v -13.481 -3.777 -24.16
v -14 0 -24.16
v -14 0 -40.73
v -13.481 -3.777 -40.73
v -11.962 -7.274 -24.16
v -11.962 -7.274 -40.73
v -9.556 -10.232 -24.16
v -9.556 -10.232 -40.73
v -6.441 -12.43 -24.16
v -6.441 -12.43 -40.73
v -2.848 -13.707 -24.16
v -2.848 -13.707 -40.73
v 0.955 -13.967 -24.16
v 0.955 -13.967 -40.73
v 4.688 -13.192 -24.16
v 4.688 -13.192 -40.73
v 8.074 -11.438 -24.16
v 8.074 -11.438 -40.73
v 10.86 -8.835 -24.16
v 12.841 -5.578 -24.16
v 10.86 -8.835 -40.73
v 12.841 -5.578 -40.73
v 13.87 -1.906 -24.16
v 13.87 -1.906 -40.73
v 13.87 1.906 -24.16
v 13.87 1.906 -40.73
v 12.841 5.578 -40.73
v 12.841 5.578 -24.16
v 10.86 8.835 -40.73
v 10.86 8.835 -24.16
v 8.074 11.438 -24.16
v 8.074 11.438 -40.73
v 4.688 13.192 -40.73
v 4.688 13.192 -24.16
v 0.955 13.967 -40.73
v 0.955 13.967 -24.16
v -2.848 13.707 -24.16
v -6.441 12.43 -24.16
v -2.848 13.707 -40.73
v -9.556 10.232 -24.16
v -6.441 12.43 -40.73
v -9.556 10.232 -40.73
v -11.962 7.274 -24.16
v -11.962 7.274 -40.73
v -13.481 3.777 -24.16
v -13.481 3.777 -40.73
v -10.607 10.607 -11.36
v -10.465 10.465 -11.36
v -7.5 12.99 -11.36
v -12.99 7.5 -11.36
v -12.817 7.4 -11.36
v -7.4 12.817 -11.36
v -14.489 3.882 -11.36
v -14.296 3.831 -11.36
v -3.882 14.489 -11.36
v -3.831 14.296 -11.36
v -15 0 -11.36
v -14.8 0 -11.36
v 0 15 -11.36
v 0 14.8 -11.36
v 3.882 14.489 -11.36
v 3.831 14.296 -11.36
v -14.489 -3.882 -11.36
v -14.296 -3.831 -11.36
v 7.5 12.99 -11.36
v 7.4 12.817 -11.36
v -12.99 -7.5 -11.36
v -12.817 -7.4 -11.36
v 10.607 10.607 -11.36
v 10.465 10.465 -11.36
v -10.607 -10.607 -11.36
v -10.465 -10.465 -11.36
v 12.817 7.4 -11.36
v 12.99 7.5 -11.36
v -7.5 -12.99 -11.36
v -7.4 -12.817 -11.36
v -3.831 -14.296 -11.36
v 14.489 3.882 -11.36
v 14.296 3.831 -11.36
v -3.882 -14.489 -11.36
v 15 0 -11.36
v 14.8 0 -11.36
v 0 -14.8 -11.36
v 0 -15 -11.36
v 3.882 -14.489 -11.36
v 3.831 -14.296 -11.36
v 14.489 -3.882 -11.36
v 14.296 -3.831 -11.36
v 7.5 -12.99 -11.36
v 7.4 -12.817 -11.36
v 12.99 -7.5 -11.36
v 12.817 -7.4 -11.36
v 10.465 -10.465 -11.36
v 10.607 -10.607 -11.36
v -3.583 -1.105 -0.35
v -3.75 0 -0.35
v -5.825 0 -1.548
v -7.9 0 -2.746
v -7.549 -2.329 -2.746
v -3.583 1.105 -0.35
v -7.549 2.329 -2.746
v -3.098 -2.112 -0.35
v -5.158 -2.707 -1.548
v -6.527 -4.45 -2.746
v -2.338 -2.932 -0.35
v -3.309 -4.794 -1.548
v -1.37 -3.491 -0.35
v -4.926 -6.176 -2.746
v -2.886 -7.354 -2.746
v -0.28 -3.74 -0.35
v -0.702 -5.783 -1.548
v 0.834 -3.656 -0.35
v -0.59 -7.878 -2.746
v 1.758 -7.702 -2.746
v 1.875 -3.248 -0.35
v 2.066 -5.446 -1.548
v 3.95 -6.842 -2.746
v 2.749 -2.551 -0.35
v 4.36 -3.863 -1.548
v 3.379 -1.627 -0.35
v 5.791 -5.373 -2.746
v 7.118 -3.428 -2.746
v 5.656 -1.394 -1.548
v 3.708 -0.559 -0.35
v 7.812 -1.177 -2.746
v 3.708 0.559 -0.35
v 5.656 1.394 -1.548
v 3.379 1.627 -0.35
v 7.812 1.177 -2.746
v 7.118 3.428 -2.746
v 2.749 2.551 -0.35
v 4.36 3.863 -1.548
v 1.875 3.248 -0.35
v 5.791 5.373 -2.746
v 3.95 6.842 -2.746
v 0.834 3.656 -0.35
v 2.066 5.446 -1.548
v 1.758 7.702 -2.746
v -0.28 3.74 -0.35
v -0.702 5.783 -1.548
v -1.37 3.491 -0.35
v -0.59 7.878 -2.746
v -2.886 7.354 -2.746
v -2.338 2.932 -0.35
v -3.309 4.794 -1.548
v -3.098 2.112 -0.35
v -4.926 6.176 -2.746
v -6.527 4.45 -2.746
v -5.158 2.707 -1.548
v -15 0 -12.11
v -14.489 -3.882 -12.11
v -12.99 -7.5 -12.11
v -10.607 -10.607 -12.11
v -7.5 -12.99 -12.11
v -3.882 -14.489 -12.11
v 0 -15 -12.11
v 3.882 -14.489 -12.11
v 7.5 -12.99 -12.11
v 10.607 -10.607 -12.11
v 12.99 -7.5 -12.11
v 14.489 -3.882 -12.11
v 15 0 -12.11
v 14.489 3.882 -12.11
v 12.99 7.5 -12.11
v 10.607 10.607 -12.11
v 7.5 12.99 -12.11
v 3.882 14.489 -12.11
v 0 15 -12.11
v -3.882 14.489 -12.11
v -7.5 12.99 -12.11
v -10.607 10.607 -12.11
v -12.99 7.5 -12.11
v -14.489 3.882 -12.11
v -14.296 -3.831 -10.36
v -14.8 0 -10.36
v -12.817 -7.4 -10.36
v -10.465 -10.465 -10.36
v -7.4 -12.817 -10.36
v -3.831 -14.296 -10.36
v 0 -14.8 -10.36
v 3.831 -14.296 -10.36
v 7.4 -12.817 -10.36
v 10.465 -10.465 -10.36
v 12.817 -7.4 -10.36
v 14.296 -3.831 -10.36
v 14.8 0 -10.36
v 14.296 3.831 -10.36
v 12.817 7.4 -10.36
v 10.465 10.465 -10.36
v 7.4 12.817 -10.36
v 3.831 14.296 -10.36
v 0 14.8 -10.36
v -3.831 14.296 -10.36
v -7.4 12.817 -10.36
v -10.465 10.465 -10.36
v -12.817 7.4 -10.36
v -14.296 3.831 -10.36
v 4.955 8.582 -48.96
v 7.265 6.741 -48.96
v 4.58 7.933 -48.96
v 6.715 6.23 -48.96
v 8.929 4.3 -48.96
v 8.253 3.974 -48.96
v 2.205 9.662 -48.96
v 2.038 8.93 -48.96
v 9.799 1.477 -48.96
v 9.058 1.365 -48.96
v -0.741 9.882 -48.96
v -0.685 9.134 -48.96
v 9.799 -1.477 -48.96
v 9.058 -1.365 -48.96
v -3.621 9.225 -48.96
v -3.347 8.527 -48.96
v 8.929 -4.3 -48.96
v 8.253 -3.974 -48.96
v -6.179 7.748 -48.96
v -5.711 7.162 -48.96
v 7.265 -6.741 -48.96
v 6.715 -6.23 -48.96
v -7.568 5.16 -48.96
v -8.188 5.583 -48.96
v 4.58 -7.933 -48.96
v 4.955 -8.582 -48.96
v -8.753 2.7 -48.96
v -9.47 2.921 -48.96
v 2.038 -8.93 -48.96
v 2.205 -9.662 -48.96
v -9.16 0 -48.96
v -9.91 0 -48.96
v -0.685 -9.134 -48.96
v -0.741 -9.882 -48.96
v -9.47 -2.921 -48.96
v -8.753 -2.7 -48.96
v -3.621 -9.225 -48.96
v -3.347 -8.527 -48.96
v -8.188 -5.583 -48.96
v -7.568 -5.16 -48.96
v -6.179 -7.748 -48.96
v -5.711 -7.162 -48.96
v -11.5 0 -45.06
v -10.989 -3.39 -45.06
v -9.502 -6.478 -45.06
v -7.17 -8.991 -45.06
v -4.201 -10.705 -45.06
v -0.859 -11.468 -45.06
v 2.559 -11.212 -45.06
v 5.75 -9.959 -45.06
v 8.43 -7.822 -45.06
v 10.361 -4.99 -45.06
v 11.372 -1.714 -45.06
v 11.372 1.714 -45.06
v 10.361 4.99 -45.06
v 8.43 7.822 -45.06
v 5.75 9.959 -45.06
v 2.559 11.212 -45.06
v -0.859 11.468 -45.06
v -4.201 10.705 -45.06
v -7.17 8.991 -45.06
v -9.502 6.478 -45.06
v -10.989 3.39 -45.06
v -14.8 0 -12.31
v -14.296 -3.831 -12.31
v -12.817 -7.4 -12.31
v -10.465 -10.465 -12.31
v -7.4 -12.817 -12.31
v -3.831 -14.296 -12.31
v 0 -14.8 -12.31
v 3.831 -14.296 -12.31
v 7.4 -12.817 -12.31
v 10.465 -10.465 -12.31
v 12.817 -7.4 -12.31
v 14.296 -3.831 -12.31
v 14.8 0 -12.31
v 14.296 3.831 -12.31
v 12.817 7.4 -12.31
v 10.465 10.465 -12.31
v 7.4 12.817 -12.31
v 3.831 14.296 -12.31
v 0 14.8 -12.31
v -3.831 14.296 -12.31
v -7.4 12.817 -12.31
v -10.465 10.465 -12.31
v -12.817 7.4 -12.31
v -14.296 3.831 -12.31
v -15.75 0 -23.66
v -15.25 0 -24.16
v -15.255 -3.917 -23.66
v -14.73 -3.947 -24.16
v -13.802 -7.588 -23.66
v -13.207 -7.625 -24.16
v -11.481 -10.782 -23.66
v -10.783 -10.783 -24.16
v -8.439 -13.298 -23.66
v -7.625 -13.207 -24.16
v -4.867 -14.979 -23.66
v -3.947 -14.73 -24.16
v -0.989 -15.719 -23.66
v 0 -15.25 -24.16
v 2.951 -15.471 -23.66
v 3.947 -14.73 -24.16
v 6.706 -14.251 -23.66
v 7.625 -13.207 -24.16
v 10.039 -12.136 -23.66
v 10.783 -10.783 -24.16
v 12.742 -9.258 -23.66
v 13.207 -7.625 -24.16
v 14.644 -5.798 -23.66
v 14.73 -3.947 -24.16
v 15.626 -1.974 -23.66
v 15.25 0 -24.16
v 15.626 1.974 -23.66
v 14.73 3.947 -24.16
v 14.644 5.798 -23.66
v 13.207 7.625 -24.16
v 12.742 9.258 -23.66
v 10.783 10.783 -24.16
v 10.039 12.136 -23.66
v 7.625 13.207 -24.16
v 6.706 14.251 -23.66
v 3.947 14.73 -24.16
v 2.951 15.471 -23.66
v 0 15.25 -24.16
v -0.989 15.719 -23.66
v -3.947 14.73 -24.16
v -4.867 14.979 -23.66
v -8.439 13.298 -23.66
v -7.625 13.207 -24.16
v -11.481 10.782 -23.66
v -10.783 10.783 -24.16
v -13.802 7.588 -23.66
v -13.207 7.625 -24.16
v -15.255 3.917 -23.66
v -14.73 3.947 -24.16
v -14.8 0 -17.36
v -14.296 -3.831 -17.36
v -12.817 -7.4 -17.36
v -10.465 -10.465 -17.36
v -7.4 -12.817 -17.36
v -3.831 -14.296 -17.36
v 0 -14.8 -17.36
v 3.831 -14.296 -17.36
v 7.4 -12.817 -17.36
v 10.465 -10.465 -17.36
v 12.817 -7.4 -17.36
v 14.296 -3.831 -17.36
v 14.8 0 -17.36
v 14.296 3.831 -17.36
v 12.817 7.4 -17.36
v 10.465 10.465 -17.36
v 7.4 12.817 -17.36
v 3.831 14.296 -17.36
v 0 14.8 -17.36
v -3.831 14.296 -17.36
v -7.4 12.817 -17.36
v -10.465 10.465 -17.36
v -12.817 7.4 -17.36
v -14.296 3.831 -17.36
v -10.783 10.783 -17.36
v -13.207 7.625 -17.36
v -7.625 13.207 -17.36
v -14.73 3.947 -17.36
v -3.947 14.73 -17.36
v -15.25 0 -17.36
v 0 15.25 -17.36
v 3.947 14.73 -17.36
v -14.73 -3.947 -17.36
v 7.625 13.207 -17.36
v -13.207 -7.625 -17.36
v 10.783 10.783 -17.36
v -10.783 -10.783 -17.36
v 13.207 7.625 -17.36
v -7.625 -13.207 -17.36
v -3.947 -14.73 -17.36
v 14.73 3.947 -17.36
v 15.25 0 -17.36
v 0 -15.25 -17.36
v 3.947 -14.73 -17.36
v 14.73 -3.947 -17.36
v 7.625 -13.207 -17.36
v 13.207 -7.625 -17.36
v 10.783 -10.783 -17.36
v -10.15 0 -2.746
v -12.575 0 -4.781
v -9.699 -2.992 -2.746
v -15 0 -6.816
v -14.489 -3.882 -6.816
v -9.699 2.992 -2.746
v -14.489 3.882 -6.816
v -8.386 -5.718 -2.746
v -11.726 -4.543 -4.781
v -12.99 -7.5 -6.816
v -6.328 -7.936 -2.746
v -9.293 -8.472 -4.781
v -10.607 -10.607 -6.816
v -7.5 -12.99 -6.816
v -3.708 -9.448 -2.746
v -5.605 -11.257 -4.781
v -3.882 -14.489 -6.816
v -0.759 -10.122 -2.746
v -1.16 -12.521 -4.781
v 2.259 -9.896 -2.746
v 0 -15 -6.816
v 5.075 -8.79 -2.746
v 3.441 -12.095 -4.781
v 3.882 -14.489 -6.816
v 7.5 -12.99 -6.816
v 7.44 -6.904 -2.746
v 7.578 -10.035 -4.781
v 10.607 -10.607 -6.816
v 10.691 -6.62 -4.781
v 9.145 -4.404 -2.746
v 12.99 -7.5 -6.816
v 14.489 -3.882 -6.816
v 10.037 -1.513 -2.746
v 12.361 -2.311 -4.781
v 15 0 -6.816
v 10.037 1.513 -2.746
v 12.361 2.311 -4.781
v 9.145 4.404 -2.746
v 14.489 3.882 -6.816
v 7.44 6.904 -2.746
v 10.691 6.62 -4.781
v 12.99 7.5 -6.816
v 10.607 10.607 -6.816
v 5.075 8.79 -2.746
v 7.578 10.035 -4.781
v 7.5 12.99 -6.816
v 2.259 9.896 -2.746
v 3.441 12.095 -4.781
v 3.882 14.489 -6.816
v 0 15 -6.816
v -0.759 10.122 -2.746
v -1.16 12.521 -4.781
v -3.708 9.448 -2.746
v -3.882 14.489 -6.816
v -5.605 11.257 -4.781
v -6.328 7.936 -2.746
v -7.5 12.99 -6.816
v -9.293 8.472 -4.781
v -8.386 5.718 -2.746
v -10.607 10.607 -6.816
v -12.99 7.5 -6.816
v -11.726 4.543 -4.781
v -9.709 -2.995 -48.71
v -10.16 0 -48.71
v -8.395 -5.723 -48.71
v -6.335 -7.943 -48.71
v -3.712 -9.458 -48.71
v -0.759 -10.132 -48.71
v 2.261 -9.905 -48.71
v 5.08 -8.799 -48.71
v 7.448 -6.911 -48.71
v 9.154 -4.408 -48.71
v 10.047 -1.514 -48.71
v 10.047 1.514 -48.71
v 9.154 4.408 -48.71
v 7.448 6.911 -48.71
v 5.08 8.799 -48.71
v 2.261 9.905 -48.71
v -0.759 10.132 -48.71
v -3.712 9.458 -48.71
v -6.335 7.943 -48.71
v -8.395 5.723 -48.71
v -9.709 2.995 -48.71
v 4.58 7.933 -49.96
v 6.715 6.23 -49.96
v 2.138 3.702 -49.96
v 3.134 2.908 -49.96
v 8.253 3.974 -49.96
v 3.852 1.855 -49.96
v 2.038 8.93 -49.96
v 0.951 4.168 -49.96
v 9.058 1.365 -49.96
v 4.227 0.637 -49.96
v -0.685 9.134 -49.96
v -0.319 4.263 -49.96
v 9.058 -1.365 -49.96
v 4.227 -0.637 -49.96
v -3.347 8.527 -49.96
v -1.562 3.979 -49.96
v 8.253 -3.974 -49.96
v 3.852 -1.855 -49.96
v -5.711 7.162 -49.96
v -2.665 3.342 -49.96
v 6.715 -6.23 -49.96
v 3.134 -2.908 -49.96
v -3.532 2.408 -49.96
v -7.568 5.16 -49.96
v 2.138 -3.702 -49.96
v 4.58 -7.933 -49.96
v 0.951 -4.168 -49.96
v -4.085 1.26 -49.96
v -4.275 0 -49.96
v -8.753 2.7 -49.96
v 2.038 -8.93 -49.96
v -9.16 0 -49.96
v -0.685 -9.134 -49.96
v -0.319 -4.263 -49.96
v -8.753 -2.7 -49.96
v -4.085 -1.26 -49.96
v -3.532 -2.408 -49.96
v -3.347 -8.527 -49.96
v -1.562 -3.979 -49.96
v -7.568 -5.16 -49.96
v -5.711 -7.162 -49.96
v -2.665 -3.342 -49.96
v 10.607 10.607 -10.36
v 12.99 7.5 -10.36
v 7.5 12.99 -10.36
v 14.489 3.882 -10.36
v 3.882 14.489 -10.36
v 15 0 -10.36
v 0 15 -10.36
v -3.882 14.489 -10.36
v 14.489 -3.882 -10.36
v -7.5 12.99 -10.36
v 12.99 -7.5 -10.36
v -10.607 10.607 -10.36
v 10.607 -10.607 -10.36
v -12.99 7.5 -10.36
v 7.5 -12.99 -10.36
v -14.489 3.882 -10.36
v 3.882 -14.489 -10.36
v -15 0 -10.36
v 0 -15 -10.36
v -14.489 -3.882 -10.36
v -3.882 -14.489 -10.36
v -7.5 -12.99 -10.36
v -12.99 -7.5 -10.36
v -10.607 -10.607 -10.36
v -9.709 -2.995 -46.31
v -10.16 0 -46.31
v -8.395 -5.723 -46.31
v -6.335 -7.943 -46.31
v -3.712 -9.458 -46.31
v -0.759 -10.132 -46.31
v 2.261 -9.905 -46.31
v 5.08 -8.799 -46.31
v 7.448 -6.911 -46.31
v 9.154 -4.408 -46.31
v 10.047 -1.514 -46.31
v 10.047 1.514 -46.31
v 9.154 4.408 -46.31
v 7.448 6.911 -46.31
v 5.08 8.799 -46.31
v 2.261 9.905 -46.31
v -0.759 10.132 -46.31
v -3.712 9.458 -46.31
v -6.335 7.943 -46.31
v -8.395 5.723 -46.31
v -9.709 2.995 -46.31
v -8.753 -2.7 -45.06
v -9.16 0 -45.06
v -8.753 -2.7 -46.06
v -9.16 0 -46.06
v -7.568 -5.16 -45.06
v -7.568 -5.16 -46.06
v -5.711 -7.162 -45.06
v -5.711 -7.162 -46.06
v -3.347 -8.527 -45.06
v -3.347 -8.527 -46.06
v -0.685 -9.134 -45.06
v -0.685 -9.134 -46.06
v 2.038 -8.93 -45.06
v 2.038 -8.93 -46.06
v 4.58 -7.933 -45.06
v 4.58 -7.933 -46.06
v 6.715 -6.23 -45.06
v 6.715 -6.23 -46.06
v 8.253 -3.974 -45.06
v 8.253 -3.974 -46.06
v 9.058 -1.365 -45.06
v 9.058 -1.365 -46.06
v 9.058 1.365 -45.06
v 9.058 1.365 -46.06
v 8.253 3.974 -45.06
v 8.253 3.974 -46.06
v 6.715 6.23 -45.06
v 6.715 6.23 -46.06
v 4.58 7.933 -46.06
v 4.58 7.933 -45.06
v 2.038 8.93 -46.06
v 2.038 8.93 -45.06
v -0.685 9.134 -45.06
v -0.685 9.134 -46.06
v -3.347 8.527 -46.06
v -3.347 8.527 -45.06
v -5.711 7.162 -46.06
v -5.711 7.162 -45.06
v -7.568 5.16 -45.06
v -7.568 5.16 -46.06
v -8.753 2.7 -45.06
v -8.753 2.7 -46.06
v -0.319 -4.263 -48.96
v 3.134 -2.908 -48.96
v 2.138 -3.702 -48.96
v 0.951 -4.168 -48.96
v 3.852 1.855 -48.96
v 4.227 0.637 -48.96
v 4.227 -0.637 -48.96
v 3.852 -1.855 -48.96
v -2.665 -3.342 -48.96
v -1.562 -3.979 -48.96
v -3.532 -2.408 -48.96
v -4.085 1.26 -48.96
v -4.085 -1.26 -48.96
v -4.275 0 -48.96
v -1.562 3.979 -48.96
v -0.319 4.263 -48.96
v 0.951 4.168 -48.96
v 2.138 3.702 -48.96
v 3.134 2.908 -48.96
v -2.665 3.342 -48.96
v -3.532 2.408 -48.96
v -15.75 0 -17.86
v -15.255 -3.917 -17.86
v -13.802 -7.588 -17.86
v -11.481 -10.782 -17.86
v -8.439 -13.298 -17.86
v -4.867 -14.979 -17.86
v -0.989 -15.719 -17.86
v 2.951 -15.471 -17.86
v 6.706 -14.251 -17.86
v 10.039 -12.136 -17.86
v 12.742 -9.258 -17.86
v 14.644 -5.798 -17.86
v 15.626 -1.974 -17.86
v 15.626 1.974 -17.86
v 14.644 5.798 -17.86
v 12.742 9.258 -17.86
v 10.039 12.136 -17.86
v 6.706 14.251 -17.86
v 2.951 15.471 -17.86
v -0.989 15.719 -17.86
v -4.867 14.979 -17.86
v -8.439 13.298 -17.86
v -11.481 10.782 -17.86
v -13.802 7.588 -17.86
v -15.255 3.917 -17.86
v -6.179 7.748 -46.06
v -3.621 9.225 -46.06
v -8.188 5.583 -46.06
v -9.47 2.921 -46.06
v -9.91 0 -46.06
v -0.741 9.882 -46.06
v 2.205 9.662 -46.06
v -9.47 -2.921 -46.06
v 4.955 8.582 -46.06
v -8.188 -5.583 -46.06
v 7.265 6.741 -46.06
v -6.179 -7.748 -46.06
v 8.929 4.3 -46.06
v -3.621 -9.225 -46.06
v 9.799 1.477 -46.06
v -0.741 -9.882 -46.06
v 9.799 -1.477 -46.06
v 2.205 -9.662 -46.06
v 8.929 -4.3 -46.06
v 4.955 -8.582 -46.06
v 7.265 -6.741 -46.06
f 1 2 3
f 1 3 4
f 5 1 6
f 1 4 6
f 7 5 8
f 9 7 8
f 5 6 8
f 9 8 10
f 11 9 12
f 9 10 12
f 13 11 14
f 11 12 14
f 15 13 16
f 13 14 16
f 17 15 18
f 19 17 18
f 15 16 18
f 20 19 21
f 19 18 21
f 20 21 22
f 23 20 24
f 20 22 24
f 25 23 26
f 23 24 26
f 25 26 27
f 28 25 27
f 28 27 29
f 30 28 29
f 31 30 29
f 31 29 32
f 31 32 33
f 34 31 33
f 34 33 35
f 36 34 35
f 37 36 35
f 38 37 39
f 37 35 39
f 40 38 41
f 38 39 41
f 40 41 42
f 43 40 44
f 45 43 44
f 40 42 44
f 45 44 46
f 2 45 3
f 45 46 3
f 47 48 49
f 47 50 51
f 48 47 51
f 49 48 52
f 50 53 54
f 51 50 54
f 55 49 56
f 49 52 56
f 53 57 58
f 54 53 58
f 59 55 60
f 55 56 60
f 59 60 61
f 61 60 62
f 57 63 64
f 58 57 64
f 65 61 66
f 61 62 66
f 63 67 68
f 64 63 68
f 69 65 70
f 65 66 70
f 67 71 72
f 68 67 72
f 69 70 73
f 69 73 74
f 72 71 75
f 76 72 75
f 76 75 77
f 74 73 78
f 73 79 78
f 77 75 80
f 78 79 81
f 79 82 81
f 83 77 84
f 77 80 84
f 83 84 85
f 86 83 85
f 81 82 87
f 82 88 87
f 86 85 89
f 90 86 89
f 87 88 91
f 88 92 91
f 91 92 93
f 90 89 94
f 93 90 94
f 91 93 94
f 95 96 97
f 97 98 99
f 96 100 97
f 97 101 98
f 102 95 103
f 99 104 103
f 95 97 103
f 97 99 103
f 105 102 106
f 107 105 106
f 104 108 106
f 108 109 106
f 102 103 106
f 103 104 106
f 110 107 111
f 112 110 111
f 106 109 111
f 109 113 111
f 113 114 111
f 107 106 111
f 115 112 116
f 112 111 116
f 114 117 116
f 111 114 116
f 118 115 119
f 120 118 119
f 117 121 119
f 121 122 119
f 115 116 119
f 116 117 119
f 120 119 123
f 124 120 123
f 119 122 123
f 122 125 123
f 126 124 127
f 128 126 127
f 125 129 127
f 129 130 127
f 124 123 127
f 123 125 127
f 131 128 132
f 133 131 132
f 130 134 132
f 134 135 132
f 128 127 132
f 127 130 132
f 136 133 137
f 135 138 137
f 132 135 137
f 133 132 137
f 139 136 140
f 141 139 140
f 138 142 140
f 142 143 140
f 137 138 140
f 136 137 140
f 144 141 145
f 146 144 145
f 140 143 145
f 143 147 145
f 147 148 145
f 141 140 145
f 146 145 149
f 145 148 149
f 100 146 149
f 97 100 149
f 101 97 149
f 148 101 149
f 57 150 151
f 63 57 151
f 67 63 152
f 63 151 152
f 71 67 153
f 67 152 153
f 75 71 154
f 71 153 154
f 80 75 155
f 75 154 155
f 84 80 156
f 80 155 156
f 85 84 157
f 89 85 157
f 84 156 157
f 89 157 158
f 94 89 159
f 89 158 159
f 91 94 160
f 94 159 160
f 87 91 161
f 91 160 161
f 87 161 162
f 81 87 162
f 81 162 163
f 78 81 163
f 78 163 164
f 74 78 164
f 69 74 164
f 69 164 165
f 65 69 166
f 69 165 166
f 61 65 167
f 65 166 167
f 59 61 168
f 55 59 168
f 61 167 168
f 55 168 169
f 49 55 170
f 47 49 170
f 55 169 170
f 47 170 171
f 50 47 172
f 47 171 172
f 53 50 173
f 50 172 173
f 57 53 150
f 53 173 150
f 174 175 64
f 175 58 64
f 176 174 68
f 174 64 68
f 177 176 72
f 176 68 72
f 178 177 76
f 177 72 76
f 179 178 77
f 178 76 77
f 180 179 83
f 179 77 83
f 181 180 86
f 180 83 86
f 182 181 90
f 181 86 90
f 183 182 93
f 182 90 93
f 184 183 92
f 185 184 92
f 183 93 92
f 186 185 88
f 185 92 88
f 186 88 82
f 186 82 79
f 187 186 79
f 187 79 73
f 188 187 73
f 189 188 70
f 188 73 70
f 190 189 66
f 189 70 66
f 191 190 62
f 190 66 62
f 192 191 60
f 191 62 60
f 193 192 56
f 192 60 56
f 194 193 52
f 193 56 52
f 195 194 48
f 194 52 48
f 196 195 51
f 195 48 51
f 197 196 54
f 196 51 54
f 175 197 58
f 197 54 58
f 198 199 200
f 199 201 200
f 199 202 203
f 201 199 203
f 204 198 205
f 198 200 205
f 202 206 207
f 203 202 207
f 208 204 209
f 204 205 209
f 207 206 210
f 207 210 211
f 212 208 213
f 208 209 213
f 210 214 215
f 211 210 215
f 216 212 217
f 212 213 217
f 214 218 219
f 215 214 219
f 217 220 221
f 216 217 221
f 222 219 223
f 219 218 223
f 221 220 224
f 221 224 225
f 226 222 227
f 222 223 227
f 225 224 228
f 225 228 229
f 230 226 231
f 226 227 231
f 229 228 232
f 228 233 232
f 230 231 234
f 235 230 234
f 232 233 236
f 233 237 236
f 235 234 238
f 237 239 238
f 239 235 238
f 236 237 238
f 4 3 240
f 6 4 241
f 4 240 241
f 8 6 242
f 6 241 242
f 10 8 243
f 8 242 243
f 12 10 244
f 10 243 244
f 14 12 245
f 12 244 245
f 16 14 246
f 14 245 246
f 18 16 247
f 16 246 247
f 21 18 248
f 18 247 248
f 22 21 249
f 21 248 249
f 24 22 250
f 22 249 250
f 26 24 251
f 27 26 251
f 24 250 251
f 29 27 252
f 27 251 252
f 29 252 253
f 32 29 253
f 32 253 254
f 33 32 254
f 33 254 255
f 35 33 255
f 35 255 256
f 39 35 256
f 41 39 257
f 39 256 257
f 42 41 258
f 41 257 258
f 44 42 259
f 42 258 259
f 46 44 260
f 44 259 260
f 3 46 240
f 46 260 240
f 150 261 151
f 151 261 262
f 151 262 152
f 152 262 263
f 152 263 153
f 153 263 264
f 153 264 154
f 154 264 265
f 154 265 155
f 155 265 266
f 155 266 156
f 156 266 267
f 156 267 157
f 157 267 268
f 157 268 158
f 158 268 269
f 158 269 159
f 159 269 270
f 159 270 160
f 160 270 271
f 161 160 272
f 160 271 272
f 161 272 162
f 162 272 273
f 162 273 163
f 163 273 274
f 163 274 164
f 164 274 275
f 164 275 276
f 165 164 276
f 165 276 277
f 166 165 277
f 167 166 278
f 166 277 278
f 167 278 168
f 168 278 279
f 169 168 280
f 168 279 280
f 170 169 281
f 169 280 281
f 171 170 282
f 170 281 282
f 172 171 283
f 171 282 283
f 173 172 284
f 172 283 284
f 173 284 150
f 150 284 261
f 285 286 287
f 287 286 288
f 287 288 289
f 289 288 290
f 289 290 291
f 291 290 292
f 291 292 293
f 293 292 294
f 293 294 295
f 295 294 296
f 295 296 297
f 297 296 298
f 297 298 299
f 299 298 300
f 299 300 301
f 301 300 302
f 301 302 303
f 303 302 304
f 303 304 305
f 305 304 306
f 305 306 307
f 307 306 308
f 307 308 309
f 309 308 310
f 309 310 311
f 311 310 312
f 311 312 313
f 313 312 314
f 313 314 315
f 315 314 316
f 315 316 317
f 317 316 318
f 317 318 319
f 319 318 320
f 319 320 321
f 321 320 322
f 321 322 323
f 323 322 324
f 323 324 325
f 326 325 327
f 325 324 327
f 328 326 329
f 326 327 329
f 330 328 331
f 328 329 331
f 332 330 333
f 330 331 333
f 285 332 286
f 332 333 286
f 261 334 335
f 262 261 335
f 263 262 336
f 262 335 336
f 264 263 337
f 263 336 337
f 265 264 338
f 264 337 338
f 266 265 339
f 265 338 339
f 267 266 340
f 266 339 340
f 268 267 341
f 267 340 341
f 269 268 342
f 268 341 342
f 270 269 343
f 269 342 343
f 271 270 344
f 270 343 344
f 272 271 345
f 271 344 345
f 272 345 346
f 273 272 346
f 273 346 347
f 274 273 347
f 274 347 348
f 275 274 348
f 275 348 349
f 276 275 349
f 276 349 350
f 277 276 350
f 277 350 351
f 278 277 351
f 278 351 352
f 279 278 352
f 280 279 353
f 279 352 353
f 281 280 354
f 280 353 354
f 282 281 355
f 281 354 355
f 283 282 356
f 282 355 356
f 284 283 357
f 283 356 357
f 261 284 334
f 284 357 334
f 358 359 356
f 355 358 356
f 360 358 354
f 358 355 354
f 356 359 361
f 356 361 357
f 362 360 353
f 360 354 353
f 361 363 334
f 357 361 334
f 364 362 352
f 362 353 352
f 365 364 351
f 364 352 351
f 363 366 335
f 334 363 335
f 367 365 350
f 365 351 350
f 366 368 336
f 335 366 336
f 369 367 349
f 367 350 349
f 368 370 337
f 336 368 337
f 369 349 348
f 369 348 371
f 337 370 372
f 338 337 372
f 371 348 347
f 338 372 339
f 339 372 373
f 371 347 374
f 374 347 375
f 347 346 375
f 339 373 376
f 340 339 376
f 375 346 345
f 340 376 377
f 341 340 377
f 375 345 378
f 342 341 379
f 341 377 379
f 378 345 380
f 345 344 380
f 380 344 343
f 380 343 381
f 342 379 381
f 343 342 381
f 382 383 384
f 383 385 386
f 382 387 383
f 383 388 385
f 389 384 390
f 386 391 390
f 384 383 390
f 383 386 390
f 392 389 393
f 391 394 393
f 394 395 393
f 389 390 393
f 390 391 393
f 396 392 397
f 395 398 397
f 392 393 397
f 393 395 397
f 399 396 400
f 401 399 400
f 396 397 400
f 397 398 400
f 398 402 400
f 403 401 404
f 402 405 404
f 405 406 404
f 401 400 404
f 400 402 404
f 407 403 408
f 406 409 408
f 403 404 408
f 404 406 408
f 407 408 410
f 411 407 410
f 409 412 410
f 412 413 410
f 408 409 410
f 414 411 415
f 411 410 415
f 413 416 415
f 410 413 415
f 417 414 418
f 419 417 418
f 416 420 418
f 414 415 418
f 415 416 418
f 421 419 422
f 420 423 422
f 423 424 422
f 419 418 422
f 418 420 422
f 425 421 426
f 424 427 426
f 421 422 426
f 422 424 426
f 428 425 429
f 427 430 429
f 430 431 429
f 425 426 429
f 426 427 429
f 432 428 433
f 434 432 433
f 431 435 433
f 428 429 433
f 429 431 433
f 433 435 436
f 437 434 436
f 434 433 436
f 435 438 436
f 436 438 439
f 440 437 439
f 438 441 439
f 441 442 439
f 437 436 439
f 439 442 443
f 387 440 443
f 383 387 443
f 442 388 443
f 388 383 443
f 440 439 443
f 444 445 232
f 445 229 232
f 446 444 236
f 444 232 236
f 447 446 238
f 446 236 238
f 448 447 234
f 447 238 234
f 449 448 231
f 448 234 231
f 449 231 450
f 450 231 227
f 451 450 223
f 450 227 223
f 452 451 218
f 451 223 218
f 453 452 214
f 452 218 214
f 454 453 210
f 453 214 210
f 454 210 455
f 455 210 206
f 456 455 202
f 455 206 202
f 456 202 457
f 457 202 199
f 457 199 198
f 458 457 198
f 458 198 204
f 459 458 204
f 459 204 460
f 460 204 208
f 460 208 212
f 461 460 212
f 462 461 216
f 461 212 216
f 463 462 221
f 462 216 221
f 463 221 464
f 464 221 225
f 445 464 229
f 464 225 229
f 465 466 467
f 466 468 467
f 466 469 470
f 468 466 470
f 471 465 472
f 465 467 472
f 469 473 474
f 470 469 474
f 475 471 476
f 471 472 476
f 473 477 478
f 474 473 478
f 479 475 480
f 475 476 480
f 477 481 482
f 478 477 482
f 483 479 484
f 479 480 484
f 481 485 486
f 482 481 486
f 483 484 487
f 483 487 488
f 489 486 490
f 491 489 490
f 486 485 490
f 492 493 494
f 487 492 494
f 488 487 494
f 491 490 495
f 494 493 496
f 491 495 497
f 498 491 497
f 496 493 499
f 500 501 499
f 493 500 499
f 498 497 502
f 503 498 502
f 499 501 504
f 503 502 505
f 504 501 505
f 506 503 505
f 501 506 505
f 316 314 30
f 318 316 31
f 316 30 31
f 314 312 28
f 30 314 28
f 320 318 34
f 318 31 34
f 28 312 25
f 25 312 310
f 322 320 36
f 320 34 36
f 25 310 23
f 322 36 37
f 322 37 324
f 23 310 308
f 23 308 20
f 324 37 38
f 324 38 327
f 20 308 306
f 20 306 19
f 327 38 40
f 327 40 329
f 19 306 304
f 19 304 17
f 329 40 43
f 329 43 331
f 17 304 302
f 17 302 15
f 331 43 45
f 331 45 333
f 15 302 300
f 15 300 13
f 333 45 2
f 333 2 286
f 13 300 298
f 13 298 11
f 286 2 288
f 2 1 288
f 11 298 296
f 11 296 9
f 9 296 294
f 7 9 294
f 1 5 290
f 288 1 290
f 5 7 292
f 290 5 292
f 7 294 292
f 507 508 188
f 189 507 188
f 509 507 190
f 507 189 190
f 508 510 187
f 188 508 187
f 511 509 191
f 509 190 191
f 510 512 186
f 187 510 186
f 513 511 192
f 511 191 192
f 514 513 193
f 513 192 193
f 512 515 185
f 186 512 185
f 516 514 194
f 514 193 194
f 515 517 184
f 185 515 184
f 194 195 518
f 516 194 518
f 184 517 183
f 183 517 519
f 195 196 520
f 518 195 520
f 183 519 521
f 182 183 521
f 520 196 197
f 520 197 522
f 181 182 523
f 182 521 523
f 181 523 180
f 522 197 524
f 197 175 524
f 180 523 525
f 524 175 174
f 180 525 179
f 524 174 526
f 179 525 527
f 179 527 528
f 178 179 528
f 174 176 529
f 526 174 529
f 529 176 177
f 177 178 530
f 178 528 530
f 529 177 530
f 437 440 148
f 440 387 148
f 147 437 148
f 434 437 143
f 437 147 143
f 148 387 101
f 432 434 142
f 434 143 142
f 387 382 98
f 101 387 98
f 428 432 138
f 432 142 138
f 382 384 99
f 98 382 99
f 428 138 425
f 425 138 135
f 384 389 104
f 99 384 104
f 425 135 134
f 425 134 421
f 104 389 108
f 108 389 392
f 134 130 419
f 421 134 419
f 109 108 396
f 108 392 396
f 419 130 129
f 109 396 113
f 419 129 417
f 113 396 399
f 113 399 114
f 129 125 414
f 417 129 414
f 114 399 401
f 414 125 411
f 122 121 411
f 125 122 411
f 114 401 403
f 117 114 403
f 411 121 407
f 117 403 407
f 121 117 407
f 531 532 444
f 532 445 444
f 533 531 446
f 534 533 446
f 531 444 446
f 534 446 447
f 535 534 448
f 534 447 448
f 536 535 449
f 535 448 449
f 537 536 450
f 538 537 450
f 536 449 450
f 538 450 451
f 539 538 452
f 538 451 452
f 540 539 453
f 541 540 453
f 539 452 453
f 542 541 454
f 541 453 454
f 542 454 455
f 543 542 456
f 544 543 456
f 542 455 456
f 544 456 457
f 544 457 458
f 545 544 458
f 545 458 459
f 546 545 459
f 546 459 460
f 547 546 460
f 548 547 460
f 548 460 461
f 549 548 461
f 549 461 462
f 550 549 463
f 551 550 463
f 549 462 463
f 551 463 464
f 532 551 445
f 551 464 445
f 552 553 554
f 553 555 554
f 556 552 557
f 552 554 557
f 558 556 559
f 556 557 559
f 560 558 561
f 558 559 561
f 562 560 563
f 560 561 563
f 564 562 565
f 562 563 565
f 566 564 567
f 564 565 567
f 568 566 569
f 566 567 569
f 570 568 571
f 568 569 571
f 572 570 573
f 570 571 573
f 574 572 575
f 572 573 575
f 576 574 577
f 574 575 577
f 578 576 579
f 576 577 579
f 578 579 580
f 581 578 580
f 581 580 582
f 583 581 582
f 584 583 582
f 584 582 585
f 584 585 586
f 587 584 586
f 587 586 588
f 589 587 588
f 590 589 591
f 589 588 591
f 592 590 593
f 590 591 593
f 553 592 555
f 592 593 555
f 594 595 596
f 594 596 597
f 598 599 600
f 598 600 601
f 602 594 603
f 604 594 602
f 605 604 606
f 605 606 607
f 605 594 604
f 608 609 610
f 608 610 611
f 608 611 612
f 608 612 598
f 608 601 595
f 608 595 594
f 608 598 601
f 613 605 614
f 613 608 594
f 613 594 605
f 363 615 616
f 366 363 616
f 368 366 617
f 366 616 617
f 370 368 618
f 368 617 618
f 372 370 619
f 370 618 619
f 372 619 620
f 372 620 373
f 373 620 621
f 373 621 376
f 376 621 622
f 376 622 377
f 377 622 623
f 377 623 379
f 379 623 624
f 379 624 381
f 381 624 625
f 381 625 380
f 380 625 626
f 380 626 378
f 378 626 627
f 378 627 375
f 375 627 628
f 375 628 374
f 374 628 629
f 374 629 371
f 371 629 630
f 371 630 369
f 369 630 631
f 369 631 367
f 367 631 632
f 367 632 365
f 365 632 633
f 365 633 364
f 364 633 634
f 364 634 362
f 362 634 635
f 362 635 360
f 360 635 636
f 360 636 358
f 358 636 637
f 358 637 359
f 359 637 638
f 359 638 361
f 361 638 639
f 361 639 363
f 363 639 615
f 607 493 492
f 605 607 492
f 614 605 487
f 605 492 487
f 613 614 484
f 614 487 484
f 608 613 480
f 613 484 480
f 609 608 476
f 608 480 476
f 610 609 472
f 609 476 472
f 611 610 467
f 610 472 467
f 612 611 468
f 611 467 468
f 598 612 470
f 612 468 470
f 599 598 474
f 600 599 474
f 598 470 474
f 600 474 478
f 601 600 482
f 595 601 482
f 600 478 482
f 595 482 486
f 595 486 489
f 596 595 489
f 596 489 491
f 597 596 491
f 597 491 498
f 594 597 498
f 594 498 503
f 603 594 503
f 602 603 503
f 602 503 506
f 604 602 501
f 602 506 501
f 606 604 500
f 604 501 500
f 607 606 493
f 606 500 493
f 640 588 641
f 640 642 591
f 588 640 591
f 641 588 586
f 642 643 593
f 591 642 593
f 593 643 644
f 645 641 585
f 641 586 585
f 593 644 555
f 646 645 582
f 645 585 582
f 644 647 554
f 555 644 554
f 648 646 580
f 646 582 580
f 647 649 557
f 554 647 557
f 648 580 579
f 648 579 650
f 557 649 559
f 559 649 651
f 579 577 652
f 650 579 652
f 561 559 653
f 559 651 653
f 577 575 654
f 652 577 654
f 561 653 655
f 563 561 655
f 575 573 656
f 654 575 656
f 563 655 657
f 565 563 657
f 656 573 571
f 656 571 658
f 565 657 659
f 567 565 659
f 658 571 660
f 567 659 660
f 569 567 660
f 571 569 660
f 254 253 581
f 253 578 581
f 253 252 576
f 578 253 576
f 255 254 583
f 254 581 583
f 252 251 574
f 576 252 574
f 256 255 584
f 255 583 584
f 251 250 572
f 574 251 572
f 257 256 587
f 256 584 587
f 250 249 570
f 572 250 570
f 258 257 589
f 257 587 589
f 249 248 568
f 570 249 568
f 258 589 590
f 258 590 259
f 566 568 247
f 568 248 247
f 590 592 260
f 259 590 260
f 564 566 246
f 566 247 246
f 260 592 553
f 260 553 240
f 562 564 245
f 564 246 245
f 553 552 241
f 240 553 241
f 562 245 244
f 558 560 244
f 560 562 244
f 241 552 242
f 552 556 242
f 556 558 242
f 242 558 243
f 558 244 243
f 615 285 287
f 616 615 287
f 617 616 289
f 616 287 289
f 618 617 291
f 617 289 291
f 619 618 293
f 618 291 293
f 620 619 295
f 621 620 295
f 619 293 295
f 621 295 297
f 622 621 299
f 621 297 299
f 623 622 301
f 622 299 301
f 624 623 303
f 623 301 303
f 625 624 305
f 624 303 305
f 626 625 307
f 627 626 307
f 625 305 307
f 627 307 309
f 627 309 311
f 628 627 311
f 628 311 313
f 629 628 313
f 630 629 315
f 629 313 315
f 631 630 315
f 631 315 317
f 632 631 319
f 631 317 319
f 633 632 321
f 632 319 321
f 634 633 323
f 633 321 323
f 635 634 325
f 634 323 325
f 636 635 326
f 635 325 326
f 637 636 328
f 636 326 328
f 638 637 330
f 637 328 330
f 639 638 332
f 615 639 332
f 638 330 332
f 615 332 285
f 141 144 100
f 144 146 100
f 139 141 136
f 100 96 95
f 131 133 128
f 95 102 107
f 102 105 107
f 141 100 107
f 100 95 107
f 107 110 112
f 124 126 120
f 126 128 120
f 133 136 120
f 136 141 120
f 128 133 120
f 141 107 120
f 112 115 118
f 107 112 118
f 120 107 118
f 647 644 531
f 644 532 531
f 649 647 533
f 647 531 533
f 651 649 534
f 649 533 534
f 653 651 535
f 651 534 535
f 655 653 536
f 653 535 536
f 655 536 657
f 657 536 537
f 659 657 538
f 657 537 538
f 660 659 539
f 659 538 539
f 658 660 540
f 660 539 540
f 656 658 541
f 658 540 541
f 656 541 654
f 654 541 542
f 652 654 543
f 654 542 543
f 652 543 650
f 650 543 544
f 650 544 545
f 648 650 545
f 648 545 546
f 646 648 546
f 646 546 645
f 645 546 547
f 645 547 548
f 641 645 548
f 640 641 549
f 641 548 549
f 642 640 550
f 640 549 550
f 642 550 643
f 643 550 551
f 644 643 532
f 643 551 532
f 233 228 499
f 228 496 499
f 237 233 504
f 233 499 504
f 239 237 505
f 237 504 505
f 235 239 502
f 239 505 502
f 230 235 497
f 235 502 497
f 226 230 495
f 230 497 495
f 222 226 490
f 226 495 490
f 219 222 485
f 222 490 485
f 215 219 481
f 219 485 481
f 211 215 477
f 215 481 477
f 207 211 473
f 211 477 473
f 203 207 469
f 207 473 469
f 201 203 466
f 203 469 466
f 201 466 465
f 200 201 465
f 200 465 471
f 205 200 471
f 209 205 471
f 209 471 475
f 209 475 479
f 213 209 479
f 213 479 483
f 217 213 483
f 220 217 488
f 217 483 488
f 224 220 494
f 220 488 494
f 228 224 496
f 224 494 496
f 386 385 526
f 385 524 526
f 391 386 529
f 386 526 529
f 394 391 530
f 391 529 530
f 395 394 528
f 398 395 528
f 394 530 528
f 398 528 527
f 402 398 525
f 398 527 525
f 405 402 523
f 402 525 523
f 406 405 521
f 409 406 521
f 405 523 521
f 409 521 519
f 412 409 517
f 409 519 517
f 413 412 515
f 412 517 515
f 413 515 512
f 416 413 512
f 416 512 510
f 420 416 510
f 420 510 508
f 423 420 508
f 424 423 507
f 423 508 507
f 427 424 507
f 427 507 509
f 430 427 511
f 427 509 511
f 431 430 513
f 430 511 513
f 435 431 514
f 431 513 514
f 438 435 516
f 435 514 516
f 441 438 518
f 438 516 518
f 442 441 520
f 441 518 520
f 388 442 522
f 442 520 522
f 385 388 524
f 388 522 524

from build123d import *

# Parameters (mm, degrees)
CHAMFER1_SIZE      = 0.25
CHAMFER2_SIZE      = 0.5
SKETCH2_R          = 4.275
CUT_EXTRUDE1_DEPTH = 1


with BuildPart() as part:
    # Sketch1 → Revolve1 (revolve)
    with BuildSketch(Plane(origin=(0, 0, 0), x_dir=(1, 0, 0), z_dir=(0, 1, 0))):
        Polygon((0, 0.35), (-3.75, 0.35), (-7.9, 2.746003617), (-10.15, 2.746003617), (-15, 6.815636828), (-15, 10.36), (-14.8, 10.36), (-14.8, 11.36), (-15, 11.36), (-15, 12.36), (-14.8, 12.36), (-14.8, 17.36), (-15.75, 17.36), (-15.75, 24.16), (-14, 24.16), (-14, 40.729872981), (-11.5, 45.06), (-9.16, 45.06), (-9.16, 46.06), (-10.16, 46.06), (-10.16, 48.96), (-9.16, 48.96), (-9.16, 49.96), (0, 49.96), align=None)
    revolve(axis=Axis((0, 0, -49.96), (0, 0, 1)))

    # Chamfer1
    # the kernel refuses this chamfer: 0.25 mm, written as the material it takes off along each edge
    with BuildSketch(Plane(origin=(0, 0, -12.36), x_dir=(-1, 0, 0), z_dir=(0, 1, 0))) as chamfer1_piece_1_section:
        Polygon((15, CHAMFER1_SIZE), (15 - CHAMFER1_SIZE, 0), (15, 0), align=None)
    chamfer1_piece_1 = revolve(axis=Axis((0, 0, -12.36), (0, 0, 1)), mode=Mode.PRIVATE)
    chamfer1_piece_1 = chamfer1_piece_1 - Plane(origin=(0, 0, -12.216726666), x_dir=(-1, 0, 0), z_dir=(0, 0, -1)) * Cylinder(14.8, 60, mode=Mode.PRIVATE)
    add(chamfer1_piece_1, mode=Mode.SUBTRACT)
    with BuildSketch(Plane(origin=(0, 0, -48.96), x_dir=(-1, 0, 0), z_dir=(0, 1, 0))) as chamfer1_piece_2:
        Polygon((10.16, CHAMFER1_SIZE), (10.16 - CHAMFER1_SIZE, 0), (10.16, 0), align=None)
    revolve(axis=Axis((0, 0, -48.96), (0, 0, 1)), mode=Mode.SUBTRACT)
    with BuildSketch(Plane(origin=(0, 0, -46.06), x_dir=(-1, 0, 0), z_dir=(0, 1, 0))) as chamfer1_piece_3:
        Polygon((10.16 - CHAMFER1_SIZE, 0), (10.16, -CHAMFER1_SIZE), (10.16, 0), align=None)
    revolve(axis=Axis((0, 0, -46.06), (0, 0, 1)), mode=Mode.SUBTRACT)

    # Chamfer2
    chamfer2_edges = [part.edges().sort_by_distance(p)[0] for p in [
        (15.75, 0, -24.16),
        (15.75, 0, -17.36),
    ]]
    chamfer(chamfer2_edges, length=CHAMFER2_SIZE)

    # Sketch2 → Cut-Extrude1 (cut)
    with BuildSketch(Plane(origin=(0, 0, -49.96), x_dir=(-1, 0, 0), z_dir=(0, 0, -1))):
        Circle(SKETCH2_R)
    extrude(amount=-CUT_EXTRUDE1_DEPTH, mode=Mode.SUBTRACT)


solid = part.part
